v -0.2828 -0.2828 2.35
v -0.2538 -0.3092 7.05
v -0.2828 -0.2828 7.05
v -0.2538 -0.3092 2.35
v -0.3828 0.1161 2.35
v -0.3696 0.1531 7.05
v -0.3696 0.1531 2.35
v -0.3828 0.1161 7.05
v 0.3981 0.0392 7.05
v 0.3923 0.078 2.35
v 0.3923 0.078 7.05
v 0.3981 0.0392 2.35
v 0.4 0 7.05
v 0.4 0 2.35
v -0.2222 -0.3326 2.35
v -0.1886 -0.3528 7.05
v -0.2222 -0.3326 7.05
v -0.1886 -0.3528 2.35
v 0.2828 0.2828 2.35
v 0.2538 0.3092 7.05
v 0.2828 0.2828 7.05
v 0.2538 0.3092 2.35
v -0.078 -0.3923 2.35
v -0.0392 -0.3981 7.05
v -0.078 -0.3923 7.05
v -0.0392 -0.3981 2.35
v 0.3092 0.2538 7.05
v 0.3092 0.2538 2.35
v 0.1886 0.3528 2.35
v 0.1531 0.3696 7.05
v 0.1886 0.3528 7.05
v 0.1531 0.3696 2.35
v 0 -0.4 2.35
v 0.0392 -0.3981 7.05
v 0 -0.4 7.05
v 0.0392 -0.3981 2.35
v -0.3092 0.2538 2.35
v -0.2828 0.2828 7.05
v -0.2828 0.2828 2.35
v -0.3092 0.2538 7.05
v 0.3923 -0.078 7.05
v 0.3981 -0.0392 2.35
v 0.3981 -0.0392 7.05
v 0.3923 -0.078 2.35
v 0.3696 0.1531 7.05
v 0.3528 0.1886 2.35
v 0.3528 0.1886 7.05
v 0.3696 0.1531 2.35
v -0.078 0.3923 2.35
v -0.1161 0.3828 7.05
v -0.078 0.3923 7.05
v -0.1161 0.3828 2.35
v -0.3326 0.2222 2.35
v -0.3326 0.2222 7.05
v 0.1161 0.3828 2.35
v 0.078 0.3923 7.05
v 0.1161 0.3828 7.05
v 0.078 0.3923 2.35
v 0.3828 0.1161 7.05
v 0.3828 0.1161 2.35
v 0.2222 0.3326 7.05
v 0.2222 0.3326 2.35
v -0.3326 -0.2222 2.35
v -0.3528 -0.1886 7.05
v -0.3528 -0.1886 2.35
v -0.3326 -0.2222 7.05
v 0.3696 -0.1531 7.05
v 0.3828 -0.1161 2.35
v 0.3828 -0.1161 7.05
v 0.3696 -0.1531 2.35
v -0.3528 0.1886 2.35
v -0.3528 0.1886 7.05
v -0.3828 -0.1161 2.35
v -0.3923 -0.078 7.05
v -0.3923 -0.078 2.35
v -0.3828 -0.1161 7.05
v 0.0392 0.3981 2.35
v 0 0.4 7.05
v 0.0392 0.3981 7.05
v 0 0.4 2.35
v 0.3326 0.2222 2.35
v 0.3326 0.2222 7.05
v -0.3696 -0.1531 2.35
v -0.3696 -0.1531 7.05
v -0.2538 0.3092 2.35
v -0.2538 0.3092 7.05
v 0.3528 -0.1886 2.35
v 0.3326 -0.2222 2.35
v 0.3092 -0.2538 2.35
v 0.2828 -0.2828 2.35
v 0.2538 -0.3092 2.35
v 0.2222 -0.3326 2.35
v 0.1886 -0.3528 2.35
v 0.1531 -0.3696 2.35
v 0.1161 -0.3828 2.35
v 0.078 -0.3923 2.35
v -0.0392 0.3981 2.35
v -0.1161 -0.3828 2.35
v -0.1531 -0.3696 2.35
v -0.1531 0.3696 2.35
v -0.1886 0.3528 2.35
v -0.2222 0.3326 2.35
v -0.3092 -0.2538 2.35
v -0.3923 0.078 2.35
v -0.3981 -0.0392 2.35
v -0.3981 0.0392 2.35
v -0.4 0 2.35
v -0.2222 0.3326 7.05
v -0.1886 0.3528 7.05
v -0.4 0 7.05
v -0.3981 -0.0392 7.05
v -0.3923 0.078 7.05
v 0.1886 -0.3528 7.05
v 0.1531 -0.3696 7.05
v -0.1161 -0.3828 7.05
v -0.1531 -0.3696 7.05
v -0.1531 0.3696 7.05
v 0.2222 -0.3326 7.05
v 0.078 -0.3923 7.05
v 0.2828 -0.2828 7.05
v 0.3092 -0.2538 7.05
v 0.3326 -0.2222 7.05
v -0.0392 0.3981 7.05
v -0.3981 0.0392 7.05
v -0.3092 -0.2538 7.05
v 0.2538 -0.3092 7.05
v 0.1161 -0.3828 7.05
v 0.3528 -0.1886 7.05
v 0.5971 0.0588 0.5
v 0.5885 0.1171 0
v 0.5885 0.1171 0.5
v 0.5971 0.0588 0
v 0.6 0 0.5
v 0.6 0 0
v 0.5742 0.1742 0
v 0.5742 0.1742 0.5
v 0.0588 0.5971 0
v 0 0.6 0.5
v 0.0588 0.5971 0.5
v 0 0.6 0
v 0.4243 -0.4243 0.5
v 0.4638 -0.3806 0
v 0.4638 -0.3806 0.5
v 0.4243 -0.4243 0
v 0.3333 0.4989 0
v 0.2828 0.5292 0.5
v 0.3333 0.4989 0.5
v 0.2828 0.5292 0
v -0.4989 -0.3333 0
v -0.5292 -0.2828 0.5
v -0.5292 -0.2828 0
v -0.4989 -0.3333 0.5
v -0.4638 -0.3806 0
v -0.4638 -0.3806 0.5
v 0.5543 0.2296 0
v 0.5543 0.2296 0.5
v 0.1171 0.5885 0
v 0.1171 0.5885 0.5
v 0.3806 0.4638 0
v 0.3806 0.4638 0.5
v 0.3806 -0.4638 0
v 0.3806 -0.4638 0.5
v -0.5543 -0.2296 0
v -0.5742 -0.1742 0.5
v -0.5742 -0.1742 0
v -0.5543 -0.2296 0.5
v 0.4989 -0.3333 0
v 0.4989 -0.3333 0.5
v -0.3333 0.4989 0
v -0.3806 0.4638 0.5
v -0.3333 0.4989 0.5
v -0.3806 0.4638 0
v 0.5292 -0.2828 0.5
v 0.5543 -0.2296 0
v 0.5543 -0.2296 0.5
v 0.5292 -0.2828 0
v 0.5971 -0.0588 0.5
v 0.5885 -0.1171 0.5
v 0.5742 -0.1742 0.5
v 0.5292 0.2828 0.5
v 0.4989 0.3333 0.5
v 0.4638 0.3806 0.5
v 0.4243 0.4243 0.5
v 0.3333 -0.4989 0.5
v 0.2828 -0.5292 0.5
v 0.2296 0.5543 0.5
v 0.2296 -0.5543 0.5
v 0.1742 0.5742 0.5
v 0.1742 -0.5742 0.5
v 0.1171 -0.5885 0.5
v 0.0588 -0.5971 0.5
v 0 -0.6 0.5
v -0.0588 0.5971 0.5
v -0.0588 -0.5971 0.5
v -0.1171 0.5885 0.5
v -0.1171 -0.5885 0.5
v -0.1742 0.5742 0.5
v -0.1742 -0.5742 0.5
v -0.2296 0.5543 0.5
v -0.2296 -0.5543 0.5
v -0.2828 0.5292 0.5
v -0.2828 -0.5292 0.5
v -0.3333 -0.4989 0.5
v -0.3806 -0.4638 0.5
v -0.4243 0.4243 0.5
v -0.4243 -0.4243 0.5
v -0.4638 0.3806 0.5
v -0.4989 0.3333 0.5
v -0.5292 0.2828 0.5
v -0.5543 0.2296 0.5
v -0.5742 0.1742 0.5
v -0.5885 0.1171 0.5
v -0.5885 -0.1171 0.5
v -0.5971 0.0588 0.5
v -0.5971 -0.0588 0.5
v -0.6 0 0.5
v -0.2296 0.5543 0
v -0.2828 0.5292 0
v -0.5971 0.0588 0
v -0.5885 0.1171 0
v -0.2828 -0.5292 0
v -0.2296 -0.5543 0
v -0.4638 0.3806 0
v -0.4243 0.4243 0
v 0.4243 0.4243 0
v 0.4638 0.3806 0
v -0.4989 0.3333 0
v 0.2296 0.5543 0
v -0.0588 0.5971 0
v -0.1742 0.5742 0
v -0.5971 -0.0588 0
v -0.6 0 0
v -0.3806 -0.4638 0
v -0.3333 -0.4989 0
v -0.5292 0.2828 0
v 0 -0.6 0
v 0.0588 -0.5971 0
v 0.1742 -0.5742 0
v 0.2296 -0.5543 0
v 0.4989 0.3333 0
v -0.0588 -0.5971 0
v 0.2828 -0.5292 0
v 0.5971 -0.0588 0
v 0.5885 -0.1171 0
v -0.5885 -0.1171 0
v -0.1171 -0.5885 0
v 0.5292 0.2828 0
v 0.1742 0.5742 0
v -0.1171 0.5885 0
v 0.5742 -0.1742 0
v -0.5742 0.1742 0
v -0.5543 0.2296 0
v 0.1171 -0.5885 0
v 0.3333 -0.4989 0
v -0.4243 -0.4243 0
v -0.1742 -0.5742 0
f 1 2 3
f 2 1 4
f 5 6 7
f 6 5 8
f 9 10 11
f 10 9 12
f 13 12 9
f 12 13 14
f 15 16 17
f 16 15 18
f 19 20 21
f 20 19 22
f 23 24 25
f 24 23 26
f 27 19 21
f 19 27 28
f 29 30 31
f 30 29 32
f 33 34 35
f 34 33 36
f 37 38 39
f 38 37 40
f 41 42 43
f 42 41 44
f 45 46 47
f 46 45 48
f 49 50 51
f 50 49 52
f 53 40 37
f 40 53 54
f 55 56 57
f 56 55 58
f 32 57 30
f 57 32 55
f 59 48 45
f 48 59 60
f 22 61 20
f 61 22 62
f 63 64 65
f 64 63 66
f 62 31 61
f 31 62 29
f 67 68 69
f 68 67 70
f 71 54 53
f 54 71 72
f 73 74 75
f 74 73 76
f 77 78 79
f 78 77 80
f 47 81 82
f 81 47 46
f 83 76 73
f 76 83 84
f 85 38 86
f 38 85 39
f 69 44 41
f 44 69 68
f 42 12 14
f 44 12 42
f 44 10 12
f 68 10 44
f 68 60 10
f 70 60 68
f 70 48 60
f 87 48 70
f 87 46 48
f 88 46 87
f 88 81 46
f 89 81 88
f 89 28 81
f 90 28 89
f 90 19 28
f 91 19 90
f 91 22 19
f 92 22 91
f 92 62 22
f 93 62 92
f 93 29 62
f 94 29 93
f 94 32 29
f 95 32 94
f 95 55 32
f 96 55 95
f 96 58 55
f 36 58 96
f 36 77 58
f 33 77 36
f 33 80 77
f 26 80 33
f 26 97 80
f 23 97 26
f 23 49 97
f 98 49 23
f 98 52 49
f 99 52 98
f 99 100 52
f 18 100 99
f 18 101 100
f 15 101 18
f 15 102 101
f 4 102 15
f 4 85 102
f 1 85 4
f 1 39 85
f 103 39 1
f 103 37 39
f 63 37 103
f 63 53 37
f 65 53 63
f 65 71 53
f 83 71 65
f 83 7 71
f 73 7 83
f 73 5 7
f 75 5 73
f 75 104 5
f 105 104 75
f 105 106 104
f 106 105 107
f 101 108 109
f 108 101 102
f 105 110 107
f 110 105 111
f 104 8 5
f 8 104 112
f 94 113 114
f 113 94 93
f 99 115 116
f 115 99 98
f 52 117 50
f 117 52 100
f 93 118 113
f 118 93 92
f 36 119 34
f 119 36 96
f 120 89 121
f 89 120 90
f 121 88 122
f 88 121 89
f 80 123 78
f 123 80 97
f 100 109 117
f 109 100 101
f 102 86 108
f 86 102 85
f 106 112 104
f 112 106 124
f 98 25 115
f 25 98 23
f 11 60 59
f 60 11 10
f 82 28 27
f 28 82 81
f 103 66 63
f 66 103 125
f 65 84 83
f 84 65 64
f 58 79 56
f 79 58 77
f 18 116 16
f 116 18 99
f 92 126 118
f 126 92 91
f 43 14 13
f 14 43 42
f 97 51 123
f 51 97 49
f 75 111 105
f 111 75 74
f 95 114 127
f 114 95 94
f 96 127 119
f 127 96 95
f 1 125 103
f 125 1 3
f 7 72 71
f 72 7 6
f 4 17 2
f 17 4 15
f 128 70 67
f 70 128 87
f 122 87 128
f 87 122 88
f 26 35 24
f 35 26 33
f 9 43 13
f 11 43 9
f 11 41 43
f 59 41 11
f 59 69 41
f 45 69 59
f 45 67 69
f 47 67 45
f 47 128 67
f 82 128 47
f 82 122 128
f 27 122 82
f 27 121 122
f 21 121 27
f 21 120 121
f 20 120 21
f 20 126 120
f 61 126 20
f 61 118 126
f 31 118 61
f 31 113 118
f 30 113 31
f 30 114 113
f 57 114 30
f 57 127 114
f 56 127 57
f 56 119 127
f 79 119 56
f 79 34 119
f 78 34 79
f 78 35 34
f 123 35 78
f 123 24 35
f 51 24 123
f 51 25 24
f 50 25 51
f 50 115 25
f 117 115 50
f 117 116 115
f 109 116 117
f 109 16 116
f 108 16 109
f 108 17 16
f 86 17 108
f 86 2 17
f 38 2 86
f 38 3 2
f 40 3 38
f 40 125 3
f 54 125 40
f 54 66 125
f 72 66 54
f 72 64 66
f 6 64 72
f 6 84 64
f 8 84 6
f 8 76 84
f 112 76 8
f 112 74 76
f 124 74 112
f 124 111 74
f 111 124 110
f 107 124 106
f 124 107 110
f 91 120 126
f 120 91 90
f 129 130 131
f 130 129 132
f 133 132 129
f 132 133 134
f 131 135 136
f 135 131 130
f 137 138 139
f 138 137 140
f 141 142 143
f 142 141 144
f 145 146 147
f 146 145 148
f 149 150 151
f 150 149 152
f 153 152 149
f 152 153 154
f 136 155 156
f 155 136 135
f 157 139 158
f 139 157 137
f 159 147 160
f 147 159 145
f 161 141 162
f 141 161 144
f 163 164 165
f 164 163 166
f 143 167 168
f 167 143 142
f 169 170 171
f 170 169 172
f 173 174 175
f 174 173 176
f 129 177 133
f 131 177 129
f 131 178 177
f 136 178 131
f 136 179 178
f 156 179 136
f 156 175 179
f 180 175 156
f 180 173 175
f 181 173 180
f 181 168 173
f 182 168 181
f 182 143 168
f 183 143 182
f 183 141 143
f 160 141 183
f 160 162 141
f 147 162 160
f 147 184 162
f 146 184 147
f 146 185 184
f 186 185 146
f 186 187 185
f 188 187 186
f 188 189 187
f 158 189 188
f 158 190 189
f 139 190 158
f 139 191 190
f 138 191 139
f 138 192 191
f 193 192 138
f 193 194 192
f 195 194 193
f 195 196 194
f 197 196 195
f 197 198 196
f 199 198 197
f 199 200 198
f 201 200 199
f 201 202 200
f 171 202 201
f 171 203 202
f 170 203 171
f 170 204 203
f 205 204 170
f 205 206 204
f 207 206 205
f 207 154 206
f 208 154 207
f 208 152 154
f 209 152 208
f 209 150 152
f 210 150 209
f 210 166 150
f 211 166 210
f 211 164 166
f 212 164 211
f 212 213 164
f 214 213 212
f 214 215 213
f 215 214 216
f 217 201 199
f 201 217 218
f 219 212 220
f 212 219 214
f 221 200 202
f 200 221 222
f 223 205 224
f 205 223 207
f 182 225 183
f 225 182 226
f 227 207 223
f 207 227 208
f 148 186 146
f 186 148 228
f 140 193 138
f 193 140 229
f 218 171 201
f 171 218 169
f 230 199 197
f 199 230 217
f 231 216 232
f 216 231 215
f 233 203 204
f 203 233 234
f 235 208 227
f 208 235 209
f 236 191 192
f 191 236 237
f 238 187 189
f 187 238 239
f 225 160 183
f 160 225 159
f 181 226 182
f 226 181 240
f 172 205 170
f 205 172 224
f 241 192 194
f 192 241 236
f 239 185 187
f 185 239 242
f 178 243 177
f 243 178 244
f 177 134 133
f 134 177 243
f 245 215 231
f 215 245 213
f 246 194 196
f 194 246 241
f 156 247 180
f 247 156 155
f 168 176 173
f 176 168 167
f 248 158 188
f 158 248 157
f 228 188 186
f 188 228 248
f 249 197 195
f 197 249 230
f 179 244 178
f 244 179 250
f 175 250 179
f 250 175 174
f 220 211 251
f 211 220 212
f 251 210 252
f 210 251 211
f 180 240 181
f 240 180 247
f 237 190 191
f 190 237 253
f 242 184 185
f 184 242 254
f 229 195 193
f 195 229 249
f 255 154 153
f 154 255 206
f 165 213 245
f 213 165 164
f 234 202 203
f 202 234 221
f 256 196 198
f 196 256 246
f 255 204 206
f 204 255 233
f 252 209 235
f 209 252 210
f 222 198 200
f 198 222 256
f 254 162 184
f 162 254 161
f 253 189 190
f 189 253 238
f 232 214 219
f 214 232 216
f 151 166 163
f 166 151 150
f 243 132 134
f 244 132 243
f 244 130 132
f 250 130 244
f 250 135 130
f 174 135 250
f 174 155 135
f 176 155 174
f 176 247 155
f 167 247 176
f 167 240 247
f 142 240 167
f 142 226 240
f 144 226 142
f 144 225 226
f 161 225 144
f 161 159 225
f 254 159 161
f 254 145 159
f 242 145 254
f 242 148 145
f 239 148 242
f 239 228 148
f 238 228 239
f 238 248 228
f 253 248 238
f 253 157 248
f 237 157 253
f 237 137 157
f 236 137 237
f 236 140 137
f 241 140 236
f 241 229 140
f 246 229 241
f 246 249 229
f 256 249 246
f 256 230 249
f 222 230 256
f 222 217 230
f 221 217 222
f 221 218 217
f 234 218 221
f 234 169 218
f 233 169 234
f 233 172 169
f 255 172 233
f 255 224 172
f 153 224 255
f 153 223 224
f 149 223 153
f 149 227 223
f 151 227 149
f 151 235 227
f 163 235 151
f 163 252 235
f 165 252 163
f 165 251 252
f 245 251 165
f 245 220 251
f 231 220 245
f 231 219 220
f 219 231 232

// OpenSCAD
module toggle_switch() {
    union() {
        // Body of the switch
        translate([0, 0, 2.35])
            cylinder(h=4.7, d=0.8, $fn=64);
        
        // Base of the switch
        translate([0, 0, 0])
            cylinder(h=0.5, d=1.2, $fn=64);
    }
}

toggle_switch();
